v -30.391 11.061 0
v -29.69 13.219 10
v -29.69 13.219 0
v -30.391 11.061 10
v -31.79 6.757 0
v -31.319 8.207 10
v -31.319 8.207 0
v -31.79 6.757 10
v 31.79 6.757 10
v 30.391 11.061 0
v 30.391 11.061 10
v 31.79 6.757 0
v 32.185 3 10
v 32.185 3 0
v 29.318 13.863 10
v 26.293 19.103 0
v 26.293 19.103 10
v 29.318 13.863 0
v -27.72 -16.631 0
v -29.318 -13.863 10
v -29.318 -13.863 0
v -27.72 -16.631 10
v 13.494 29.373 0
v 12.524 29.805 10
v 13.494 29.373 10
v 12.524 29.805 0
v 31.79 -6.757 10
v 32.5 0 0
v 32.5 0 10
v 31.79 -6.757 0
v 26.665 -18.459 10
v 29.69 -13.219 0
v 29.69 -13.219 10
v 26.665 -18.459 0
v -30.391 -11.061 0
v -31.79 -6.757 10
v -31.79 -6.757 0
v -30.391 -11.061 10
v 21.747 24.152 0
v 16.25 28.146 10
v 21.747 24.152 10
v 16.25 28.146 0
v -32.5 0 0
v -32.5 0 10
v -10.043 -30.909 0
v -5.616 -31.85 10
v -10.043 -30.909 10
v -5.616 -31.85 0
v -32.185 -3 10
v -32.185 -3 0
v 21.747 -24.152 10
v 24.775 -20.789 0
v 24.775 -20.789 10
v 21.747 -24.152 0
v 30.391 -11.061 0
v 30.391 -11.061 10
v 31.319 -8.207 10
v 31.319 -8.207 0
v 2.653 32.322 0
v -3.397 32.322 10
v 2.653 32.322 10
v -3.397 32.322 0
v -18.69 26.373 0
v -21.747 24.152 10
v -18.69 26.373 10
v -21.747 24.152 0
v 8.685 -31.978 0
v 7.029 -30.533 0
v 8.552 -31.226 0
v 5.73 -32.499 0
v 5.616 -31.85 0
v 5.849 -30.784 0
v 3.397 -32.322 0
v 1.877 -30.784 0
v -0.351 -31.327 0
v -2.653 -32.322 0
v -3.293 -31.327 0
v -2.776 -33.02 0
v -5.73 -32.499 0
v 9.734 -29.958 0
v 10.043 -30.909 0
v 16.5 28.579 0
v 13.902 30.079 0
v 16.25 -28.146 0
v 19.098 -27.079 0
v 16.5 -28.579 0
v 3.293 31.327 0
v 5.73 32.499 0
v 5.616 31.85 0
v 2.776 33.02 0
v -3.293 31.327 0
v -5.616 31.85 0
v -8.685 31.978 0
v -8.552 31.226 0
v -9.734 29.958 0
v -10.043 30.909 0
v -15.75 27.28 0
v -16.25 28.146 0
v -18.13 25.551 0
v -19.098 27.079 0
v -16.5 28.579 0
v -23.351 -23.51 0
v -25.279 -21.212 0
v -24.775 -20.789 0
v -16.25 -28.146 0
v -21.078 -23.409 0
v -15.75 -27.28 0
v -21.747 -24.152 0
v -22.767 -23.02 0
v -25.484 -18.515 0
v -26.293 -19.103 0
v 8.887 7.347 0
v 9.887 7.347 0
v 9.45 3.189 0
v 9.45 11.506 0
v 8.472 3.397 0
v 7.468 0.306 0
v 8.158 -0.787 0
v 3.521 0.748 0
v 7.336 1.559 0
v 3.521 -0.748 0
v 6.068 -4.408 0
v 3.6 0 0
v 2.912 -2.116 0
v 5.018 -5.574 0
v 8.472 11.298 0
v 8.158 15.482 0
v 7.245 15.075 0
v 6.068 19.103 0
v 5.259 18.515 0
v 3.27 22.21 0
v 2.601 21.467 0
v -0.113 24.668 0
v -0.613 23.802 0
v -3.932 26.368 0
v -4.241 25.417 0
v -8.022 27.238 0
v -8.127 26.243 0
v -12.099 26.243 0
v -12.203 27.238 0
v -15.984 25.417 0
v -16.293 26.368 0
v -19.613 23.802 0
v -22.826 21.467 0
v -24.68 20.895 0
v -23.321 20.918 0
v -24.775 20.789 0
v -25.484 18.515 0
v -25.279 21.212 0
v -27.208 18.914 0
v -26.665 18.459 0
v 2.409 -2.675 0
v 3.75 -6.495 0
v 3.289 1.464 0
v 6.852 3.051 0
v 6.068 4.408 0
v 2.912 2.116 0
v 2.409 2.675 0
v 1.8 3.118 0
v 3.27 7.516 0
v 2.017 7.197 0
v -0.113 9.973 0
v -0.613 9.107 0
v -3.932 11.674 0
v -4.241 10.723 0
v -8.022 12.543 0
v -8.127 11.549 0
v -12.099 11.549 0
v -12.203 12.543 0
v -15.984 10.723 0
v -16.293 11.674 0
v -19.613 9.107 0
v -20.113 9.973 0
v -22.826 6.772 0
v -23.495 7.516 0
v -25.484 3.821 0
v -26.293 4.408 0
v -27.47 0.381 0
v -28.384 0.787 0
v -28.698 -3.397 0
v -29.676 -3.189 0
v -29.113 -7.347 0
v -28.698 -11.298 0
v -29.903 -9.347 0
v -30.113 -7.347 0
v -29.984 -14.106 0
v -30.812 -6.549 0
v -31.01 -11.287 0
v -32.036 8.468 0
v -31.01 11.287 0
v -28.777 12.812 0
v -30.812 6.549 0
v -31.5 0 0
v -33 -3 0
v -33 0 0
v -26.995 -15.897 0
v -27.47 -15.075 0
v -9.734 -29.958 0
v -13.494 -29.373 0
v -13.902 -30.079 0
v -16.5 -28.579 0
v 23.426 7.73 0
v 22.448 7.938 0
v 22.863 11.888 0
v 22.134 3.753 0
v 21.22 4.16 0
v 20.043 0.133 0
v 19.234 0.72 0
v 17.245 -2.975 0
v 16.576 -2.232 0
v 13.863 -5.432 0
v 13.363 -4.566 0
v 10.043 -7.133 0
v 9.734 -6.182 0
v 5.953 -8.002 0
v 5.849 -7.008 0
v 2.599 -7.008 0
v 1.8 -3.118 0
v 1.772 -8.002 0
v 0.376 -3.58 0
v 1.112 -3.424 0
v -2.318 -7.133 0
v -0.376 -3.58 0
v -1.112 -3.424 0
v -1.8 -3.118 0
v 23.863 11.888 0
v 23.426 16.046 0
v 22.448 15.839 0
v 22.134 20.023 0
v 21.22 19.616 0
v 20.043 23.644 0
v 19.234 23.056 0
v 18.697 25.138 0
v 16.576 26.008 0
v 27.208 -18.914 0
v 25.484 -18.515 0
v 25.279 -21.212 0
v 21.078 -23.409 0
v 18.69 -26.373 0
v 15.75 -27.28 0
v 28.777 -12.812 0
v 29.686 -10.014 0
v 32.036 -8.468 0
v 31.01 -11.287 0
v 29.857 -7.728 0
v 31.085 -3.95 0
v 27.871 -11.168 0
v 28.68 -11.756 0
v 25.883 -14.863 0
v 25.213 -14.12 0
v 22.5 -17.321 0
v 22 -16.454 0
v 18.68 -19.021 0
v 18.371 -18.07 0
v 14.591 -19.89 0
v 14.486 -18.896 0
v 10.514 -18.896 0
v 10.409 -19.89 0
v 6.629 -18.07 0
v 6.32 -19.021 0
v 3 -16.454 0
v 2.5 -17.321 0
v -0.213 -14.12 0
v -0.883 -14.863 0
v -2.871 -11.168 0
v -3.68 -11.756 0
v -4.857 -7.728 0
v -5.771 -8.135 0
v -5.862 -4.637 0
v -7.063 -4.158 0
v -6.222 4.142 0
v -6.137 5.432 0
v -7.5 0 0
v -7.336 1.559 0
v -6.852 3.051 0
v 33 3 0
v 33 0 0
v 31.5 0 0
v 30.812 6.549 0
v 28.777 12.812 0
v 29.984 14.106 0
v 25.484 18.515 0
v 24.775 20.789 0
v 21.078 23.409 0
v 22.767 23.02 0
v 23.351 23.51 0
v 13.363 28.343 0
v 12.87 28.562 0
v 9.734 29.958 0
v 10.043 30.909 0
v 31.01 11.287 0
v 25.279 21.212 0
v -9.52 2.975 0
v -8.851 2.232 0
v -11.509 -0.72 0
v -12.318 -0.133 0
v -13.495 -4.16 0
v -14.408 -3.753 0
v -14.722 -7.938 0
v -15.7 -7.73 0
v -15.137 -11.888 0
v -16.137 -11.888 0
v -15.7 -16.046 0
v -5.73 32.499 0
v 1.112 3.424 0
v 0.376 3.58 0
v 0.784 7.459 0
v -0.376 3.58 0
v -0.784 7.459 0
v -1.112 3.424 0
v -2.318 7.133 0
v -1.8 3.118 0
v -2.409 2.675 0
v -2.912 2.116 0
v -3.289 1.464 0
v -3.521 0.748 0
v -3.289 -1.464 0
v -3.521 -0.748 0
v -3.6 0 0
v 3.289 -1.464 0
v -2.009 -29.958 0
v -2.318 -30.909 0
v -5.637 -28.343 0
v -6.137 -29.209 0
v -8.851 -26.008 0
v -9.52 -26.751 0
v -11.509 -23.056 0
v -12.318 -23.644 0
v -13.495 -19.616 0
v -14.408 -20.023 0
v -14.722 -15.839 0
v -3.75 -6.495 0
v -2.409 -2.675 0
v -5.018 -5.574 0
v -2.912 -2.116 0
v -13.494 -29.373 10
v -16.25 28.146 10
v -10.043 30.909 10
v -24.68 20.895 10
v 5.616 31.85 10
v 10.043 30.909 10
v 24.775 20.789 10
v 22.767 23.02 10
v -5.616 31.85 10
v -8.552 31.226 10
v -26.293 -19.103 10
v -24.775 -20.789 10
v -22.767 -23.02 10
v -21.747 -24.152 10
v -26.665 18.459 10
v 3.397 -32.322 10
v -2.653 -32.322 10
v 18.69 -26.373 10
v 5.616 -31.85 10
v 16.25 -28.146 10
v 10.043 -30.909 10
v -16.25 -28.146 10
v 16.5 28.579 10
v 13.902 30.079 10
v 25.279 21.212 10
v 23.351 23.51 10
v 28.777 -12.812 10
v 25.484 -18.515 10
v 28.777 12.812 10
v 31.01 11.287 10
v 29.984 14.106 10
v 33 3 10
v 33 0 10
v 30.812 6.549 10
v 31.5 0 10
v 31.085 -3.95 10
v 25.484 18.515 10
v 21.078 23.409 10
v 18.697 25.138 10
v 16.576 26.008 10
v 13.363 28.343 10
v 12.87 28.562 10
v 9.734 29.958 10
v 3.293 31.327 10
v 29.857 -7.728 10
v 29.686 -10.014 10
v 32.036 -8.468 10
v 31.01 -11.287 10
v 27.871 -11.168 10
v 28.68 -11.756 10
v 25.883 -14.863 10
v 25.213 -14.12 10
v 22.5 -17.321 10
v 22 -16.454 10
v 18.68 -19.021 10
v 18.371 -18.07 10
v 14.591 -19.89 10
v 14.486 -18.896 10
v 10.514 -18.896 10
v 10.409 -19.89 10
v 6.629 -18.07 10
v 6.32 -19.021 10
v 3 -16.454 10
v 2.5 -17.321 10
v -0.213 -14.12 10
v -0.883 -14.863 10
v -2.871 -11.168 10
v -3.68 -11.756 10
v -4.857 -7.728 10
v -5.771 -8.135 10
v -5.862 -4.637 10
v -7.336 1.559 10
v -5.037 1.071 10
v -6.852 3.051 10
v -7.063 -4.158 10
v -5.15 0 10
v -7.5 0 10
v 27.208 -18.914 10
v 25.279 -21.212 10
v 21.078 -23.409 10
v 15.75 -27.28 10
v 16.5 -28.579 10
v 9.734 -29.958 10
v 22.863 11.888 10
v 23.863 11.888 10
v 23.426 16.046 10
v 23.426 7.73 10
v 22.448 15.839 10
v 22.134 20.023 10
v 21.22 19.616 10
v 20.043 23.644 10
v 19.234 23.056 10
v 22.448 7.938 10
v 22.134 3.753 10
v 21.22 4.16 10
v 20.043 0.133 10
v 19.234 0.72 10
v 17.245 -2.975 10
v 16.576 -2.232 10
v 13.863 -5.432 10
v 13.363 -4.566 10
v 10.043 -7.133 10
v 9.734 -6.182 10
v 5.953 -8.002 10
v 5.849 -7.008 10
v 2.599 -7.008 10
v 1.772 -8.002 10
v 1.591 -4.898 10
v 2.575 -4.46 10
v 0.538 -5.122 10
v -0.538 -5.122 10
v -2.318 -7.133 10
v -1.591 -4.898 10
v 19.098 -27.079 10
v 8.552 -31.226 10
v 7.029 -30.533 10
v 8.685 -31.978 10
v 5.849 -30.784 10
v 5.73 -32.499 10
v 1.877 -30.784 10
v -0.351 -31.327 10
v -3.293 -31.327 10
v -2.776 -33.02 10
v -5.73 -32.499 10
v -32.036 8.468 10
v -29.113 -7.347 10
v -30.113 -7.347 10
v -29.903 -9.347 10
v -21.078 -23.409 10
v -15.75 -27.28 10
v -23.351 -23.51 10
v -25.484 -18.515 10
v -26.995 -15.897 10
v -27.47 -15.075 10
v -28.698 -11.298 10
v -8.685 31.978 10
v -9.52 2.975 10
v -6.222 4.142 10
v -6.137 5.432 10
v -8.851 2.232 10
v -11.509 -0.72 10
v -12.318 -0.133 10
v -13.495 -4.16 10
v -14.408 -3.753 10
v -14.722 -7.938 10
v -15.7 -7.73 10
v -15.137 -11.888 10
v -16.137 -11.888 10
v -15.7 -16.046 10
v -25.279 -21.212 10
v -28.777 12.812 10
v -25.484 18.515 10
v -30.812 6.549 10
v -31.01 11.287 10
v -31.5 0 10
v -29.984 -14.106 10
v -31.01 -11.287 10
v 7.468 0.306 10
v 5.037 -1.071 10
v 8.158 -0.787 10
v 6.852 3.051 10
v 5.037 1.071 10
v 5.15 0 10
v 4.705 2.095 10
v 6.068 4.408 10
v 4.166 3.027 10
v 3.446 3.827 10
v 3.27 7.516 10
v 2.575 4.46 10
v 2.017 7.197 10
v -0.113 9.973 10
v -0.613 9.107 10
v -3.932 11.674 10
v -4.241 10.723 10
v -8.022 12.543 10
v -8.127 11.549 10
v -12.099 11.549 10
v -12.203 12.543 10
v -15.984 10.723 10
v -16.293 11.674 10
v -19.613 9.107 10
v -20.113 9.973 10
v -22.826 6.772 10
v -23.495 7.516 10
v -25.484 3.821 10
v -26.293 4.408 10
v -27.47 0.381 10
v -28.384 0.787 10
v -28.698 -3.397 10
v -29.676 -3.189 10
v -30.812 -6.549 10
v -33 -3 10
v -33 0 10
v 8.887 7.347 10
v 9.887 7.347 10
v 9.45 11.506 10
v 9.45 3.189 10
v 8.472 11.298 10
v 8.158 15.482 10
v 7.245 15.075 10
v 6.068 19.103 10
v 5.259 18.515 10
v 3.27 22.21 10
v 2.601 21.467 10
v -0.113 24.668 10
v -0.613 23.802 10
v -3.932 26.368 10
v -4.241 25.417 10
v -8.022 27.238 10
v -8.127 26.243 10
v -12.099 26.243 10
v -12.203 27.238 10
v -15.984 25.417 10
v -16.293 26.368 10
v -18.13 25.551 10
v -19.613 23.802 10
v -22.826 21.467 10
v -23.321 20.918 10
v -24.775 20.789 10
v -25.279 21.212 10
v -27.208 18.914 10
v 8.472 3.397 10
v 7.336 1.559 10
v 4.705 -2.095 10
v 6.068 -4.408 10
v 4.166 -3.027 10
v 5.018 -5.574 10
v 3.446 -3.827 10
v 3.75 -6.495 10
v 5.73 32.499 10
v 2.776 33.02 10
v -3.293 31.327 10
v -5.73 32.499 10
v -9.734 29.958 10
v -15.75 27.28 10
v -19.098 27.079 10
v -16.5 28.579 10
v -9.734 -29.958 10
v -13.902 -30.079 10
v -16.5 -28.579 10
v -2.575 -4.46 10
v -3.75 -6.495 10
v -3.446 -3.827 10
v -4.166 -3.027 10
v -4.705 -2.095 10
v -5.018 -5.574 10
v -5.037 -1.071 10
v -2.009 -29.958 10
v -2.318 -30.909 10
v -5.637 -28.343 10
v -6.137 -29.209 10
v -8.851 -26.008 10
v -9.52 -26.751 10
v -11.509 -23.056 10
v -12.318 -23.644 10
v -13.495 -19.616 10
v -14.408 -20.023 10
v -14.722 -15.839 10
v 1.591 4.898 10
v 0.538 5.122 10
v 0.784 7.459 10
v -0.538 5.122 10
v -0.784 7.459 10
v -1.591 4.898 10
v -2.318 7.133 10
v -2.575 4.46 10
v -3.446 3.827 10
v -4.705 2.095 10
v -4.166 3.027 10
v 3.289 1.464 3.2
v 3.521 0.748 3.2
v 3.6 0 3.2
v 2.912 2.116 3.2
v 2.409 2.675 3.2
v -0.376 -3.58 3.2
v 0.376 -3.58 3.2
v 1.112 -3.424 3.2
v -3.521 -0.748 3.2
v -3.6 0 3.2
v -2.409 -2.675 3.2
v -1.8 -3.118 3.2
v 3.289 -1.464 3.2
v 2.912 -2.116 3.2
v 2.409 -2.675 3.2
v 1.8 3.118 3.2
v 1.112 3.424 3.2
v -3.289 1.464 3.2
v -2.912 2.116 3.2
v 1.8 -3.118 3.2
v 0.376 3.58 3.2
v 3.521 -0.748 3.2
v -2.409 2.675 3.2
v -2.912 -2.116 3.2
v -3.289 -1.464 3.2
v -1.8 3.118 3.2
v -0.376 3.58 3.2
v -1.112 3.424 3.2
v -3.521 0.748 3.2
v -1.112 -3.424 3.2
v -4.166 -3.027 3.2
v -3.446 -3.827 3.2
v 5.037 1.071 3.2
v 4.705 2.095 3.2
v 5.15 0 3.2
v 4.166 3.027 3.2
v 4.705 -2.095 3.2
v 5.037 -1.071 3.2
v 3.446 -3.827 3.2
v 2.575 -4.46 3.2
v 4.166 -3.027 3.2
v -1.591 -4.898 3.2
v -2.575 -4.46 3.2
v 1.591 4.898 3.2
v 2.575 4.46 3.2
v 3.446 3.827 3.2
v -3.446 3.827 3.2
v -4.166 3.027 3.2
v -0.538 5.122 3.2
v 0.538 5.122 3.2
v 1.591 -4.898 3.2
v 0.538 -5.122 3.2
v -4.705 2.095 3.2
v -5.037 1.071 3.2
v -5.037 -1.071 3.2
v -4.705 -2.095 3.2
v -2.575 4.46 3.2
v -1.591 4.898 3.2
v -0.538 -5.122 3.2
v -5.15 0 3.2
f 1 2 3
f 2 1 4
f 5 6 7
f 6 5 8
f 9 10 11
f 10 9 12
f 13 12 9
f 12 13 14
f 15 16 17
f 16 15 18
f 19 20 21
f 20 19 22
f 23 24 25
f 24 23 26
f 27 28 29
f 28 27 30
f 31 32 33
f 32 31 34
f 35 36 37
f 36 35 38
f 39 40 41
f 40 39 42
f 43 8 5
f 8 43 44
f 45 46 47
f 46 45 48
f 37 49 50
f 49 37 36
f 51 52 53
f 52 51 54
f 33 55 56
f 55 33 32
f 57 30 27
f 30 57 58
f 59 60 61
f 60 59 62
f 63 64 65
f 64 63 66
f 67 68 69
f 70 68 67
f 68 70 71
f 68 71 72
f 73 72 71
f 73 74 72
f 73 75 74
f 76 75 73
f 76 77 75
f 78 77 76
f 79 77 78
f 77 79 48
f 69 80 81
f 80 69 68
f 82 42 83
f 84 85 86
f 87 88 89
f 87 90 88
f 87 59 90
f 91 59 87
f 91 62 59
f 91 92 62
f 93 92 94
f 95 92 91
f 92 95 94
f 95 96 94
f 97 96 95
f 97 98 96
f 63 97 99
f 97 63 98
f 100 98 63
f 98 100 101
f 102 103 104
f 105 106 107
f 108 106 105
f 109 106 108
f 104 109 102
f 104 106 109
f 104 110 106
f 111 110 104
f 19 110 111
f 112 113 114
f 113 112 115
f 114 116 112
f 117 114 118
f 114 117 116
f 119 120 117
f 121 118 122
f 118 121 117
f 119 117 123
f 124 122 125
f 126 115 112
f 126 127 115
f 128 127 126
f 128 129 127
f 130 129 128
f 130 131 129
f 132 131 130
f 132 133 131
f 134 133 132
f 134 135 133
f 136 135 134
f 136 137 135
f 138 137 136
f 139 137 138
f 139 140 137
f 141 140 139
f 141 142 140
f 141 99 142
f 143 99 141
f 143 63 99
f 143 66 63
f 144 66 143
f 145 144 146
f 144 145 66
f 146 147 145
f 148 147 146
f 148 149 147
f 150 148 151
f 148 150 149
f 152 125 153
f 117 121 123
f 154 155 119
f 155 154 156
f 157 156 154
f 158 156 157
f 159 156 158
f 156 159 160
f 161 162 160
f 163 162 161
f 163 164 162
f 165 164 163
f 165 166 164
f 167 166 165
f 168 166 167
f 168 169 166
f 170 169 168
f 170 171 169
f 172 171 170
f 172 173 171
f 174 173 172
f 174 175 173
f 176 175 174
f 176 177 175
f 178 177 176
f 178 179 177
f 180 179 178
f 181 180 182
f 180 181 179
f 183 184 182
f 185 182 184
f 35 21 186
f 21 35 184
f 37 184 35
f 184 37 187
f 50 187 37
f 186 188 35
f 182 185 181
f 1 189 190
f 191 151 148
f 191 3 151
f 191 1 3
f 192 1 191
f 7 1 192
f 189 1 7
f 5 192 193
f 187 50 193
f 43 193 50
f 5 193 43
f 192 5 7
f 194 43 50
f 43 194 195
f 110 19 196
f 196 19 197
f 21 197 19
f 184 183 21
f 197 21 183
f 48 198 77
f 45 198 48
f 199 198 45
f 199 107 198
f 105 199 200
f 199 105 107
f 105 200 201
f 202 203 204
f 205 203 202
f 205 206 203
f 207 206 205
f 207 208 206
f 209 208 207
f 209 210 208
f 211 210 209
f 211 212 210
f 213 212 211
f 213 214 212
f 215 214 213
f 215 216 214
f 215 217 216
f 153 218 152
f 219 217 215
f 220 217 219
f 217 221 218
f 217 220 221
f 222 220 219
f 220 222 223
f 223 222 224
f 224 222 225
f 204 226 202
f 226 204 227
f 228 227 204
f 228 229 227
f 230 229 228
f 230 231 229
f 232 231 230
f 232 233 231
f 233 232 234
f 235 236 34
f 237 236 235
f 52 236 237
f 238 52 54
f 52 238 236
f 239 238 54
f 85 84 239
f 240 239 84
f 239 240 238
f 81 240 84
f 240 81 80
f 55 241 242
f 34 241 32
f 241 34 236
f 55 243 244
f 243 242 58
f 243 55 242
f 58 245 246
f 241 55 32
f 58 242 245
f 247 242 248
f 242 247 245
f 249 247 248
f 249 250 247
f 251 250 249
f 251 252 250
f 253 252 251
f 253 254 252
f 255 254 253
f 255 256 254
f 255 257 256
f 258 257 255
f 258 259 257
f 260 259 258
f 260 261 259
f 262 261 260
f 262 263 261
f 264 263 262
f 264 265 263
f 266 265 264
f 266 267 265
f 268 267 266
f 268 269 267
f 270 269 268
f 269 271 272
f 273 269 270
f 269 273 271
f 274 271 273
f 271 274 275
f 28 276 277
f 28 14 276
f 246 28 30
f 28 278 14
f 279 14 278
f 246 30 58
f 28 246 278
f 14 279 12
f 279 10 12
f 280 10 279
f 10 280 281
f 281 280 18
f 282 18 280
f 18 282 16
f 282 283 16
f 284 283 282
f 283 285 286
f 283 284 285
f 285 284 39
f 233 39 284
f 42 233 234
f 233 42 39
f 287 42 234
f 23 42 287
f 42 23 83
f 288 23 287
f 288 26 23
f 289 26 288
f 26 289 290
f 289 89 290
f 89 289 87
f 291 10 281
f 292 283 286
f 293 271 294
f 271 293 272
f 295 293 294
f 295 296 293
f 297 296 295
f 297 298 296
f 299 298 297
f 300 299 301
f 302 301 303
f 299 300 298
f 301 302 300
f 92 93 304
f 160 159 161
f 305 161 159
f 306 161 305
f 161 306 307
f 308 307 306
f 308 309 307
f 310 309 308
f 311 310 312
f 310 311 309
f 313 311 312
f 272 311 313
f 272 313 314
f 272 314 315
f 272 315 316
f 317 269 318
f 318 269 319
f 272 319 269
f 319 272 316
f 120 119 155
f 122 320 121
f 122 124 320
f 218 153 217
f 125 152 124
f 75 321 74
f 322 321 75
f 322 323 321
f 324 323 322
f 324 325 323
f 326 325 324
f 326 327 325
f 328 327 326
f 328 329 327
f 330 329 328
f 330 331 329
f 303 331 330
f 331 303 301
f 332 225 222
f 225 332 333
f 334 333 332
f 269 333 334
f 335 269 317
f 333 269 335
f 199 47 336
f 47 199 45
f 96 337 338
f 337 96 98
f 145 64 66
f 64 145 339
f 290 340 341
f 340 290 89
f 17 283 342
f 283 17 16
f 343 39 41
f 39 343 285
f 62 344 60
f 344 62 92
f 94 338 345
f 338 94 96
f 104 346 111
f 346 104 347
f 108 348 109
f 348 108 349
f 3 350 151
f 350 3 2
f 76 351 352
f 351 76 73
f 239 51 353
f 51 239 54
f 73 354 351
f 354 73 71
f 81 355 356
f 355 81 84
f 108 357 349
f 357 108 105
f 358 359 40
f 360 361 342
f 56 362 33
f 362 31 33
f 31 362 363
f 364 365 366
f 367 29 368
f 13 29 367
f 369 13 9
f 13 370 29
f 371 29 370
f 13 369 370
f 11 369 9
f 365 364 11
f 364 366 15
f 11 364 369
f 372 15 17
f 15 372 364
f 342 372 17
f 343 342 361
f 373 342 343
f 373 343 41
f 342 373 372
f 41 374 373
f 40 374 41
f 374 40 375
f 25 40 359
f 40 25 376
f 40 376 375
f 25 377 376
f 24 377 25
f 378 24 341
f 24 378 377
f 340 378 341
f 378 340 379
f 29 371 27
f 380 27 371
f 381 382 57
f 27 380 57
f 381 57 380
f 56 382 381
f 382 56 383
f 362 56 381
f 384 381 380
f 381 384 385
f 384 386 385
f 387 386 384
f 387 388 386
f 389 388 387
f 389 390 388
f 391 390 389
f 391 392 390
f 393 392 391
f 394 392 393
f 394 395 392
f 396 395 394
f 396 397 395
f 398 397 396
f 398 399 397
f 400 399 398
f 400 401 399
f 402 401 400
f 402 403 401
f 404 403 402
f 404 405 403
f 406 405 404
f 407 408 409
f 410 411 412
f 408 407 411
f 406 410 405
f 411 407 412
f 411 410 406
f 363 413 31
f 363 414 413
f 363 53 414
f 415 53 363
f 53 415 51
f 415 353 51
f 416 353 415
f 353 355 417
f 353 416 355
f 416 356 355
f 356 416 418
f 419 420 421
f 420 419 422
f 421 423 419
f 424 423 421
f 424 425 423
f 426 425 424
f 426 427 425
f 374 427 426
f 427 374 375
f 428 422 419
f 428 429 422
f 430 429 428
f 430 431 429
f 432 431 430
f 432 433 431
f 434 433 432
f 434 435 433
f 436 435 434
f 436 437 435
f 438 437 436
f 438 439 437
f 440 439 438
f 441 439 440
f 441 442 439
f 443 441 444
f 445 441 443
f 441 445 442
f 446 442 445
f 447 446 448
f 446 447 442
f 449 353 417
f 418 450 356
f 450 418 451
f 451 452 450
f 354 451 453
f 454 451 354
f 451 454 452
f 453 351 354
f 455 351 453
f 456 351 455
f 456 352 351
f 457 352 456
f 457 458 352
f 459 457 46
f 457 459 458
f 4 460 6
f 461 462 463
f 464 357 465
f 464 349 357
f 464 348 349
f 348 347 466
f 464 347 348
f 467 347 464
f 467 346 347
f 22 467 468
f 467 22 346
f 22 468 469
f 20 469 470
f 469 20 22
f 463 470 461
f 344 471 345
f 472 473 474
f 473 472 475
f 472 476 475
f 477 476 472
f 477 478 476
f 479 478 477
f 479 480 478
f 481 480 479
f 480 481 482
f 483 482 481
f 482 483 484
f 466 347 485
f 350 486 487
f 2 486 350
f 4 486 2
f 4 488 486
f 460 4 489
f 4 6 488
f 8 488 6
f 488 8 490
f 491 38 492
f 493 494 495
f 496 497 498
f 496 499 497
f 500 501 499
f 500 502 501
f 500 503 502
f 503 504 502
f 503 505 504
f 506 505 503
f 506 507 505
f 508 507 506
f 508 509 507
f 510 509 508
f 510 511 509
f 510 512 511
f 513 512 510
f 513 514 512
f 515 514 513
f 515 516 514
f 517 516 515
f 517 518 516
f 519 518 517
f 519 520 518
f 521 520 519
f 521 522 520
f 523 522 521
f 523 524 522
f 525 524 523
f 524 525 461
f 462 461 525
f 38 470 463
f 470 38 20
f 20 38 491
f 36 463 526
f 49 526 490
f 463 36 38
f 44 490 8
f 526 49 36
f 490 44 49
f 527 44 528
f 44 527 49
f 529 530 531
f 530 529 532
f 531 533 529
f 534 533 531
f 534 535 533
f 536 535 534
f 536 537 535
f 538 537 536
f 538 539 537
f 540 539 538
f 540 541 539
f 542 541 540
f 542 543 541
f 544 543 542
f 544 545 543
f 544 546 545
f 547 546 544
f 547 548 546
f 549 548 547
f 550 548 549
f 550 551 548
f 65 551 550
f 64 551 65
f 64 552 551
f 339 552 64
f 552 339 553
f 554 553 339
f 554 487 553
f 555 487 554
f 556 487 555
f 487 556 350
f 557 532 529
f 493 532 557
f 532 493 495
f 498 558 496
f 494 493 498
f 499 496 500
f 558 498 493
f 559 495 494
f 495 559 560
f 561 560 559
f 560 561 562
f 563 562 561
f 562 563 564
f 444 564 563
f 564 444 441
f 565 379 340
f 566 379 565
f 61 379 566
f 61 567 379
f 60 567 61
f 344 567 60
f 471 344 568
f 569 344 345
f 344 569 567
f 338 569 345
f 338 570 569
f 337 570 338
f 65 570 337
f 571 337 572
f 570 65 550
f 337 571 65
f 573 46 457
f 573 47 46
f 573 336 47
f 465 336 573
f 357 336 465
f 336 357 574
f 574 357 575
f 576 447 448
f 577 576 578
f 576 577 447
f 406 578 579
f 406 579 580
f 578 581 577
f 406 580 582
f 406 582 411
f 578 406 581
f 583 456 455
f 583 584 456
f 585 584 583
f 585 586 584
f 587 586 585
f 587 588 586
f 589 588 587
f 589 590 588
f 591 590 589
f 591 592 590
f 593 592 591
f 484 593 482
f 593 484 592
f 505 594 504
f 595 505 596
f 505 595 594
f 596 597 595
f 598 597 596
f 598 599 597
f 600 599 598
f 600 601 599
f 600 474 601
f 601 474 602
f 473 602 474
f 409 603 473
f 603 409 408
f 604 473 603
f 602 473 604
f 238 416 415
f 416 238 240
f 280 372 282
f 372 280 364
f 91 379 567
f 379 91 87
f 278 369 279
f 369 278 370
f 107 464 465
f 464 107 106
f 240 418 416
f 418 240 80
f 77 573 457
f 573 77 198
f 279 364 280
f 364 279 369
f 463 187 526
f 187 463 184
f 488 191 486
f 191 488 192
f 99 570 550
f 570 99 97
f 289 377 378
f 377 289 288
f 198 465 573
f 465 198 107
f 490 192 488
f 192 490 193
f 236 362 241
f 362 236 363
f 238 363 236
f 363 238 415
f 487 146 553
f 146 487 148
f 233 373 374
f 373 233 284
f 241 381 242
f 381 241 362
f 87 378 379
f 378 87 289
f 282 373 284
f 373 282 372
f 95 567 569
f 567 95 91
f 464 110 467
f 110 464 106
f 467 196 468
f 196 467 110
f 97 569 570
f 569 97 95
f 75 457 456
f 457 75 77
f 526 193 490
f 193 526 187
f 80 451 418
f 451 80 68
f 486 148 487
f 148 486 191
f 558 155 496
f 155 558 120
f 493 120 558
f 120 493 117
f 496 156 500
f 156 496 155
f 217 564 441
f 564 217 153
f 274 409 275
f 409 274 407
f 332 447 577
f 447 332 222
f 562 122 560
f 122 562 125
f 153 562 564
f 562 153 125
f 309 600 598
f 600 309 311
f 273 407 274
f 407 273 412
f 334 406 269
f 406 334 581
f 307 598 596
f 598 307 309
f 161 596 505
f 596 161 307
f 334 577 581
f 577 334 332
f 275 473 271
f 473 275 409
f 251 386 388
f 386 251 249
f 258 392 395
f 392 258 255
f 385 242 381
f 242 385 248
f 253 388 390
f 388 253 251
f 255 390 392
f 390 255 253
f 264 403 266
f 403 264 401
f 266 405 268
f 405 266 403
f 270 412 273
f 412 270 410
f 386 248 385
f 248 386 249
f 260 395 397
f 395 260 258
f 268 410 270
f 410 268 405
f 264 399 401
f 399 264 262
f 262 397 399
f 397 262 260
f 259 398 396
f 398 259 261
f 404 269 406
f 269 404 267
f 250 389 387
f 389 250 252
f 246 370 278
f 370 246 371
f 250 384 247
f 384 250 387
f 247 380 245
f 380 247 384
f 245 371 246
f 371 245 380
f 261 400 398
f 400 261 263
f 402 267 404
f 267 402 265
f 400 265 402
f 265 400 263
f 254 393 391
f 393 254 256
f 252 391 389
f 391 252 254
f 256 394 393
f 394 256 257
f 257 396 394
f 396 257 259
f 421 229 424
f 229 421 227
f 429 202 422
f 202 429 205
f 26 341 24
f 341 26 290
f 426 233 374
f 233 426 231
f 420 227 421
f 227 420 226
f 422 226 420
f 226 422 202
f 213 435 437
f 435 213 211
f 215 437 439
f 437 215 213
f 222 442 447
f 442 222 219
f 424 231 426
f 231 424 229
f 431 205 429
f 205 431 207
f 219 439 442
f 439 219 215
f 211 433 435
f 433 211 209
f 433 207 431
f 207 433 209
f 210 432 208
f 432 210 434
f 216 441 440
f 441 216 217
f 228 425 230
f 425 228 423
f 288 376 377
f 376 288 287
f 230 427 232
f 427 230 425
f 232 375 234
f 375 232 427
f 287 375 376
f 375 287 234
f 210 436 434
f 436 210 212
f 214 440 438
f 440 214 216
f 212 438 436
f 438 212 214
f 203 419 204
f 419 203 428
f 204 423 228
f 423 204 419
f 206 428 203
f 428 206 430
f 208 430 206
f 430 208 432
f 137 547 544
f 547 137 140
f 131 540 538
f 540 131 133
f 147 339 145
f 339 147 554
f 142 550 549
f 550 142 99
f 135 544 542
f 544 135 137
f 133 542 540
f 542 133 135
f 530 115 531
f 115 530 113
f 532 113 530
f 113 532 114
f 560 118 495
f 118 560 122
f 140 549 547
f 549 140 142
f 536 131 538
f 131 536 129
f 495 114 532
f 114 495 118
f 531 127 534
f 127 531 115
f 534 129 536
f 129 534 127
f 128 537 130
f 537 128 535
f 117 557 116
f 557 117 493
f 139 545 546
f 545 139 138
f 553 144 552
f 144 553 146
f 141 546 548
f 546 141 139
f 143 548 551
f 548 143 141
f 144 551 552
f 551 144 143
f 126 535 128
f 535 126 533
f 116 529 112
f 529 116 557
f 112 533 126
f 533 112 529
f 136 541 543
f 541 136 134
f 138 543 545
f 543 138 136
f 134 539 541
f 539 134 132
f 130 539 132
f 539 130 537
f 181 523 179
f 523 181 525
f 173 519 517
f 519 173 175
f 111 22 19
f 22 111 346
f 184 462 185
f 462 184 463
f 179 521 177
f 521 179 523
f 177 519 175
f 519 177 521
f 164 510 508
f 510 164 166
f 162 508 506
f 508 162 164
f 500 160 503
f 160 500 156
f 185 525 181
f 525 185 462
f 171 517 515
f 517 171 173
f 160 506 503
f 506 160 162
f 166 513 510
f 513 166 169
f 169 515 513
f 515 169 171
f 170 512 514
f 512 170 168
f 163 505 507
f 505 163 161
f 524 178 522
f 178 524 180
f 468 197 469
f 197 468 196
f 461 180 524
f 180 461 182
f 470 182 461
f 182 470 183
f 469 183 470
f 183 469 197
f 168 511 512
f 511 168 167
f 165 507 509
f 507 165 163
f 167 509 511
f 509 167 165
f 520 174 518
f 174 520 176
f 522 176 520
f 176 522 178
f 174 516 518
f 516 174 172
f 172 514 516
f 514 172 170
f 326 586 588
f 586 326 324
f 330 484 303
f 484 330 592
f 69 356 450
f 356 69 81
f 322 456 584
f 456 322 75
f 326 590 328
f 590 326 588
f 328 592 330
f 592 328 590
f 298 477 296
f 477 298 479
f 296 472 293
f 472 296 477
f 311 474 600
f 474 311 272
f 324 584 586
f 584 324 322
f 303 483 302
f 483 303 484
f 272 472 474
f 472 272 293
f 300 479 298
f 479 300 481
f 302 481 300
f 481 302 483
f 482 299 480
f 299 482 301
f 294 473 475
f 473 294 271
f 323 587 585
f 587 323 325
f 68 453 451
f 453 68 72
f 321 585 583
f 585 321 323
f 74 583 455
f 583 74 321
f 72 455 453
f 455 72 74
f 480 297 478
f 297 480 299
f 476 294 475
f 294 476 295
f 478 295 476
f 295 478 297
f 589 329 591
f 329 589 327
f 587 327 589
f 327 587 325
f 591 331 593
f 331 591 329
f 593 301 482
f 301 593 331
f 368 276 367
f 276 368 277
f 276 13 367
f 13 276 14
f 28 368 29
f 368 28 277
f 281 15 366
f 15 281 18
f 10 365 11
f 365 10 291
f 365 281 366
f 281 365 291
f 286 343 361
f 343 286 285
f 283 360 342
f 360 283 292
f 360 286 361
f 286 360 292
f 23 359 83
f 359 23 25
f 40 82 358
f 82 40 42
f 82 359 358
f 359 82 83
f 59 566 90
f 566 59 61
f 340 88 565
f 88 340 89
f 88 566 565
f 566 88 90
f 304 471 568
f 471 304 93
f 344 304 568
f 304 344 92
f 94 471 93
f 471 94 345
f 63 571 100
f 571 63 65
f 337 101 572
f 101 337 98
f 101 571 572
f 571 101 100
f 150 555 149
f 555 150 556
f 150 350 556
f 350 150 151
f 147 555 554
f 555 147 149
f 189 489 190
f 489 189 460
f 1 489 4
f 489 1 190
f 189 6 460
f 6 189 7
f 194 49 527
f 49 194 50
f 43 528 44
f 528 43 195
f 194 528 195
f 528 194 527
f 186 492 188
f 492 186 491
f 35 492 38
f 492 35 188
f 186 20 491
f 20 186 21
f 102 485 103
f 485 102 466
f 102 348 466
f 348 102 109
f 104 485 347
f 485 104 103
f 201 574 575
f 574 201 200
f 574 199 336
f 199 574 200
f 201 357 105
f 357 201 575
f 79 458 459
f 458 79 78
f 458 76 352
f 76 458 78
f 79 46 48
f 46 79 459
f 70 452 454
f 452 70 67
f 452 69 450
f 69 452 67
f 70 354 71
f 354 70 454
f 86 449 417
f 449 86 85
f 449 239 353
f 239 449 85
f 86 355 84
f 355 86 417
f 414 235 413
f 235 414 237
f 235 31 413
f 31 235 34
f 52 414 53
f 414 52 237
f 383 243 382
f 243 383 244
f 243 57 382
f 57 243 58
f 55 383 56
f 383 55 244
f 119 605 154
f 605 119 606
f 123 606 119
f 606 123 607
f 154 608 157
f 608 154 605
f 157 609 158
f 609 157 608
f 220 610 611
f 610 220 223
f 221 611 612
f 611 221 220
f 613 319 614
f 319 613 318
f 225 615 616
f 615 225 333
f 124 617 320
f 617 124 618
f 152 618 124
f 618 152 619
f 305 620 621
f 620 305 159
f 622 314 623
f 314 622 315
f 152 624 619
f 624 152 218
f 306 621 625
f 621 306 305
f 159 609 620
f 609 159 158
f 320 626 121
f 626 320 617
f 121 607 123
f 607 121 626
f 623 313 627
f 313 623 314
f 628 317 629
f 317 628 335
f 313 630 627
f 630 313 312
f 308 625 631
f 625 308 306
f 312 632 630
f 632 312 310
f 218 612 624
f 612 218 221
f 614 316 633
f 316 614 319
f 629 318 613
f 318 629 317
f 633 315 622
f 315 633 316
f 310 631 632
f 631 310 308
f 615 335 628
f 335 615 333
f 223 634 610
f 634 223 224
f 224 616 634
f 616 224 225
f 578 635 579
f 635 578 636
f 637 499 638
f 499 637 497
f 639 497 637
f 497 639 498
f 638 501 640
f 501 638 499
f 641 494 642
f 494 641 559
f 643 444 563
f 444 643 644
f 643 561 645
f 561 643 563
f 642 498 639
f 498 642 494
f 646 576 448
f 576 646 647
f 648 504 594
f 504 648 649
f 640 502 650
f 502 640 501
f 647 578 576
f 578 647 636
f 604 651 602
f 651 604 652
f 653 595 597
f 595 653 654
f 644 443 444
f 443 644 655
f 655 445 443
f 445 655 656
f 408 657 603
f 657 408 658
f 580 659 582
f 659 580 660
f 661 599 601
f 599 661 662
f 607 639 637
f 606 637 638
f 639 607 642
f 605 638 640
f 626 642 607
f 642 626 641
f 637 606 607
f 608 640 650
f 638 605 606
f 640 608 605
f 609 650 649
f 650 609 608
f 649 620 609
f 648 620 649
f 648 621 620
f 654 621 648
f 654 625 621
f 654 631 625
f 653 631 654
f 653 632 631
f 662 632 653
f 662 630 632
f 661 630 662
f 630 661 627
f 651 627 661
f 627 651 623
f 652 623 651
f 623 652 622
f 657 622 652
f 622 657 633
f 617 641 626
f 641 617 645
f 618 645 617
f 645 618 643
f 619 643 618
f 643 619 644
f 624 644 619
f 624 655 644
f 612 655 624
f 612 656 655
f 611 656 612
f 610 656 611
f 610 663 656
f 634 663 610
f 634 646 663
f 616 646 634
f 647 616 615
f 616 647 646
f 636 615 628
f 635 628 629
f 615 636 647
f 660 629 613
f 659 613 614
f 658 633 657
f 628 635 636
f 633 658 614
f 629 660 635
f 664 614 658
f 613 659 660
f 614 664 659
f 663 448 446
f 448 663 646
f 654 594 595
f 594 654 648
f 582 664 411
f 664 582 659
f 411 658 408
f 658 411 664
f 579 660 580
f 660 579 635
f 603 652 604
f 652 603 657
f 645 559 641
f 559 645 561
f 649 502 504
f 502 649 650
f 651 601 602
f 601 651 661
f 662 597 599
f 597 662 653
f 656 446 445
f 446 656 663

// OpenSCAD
/*   	Parametric airlehttps://news.google.com/?tab=wn&hl=fr&gl=FR&ceid=FR:frhttps://news.google.com/?tab=wn&hl=fr&gl=FR&ceid=FR:frss tire
		by Travis Howse <tjhowse@gmail.com>
		2012.   License, GPL v2 or later
**************************************************/
// https://www.thingiverse.com/thing:17514/files
dia_in = 1;
dia_out = 65;// Default 40
spoke_count = 5; // Default 4
spoke_thickness = 1; //Default 0.5
tread_thickness = 1; //Default 0.5
hub_thickness = 7;
height = 10;
$fn = 30;
spoke_dia = (dia_in/2) + hub_thickness + (dia_out/2) - tread_thickness+spoke_thickness;
grip_density = 0.05;//0.05; // Set to 0 for no grip.
grip_height = 1.;
grip_depth = 3;
pi = 3.14159;
zff = 0.001;
print_wheel = true;
print_washer = false;

//Set to 1 for a double spiral.
// Note: single-wall spokes probably won't work with double spirals, as the
// first layer of the upper spiral would bridge in a straight line, rather
// than a curve. Successive layers probably wouldn't recover.
double_spiral = 0;

module wheel()
{
	difference()
	{
		cylinder(r=dia_out/2,h=height);
		cylinder(r=(dia_out/2)-tread_thickness,h=height);	
	}

	difference()
	{
		cylinder(r=(dia_in/2)+hub_thickness,h=height);
		cylinder(r=dia_in/2,h=height);	
	}

	for (i = [0:spoke_count-1])
	{
		if (double_spiral)
		{
			rotate([0,0,i * (360/spoke_count)]) translate([(spoke_dia/2)-(dia_in/2)-hub_thickness,0,(height/2)+zff]) spoke();
			rotate([180,0,i * (360/spoke_count)]) translate([(spoke_dia/2)-(dia_in/2)-hub_thickness,0,-height/2]) spoke();			
		} else {
			rotate([0,0,i * (360/spoke_count)]) translate([(spoke_dia/2)-(dia_in/2)-hub_thickness,0,0]) spoke();
		}
	}
	
	if (grip_density != 0)
	{
		for (i = [0:(360*grip_density)])
		{
			rotate([0,0,i*(360/(360*grip_density))]) translate([dia_out/2-grip_height/2,0,0]) cube([grip_height,grip_depth,height]);
		}
	}
}

module spoke()
{
	intersection()
	{
		difference()
		{
			cylinder(r=spoke_dia/2,h=height);
			cylinder(r=(spoke_dia/2)-spoke_thickness,h=height);	
		}
		if (double_spiral)
		{
			translate([-spoke_dia/2,-spoke_dia,0]) cube([spoke_dia,spoke_dia,height/2]);
		} else {
			translate([-spoke_dia/2,-spoke_dia,0]) cube([spoke_dia,spoke_dia,height]);
		}
	}
}

if (print_wheel) {
    mirror([0,0,1]) {
        translate([0,0,-height]) {
            difference() {
                wheel();
                
                // Center of the wheel
                cylinder(h=height, r1=3.6, r2=3.6, center=false);
                cylinder(h=height - 3.2, r=5.15, center=false);
            }
        }
    }
    
}

//Washer
if (print_washer) {
    translate([0,dia_out/2 + 15,0]) {
        
        difference() {
            // Center of the wheel
            cylinder(h=1.5, r1=hub_thickness, r2=hub_thickness, center=false);
            cylinder(h=1.5, r=3.6, center=false);
        }

    }    
}
